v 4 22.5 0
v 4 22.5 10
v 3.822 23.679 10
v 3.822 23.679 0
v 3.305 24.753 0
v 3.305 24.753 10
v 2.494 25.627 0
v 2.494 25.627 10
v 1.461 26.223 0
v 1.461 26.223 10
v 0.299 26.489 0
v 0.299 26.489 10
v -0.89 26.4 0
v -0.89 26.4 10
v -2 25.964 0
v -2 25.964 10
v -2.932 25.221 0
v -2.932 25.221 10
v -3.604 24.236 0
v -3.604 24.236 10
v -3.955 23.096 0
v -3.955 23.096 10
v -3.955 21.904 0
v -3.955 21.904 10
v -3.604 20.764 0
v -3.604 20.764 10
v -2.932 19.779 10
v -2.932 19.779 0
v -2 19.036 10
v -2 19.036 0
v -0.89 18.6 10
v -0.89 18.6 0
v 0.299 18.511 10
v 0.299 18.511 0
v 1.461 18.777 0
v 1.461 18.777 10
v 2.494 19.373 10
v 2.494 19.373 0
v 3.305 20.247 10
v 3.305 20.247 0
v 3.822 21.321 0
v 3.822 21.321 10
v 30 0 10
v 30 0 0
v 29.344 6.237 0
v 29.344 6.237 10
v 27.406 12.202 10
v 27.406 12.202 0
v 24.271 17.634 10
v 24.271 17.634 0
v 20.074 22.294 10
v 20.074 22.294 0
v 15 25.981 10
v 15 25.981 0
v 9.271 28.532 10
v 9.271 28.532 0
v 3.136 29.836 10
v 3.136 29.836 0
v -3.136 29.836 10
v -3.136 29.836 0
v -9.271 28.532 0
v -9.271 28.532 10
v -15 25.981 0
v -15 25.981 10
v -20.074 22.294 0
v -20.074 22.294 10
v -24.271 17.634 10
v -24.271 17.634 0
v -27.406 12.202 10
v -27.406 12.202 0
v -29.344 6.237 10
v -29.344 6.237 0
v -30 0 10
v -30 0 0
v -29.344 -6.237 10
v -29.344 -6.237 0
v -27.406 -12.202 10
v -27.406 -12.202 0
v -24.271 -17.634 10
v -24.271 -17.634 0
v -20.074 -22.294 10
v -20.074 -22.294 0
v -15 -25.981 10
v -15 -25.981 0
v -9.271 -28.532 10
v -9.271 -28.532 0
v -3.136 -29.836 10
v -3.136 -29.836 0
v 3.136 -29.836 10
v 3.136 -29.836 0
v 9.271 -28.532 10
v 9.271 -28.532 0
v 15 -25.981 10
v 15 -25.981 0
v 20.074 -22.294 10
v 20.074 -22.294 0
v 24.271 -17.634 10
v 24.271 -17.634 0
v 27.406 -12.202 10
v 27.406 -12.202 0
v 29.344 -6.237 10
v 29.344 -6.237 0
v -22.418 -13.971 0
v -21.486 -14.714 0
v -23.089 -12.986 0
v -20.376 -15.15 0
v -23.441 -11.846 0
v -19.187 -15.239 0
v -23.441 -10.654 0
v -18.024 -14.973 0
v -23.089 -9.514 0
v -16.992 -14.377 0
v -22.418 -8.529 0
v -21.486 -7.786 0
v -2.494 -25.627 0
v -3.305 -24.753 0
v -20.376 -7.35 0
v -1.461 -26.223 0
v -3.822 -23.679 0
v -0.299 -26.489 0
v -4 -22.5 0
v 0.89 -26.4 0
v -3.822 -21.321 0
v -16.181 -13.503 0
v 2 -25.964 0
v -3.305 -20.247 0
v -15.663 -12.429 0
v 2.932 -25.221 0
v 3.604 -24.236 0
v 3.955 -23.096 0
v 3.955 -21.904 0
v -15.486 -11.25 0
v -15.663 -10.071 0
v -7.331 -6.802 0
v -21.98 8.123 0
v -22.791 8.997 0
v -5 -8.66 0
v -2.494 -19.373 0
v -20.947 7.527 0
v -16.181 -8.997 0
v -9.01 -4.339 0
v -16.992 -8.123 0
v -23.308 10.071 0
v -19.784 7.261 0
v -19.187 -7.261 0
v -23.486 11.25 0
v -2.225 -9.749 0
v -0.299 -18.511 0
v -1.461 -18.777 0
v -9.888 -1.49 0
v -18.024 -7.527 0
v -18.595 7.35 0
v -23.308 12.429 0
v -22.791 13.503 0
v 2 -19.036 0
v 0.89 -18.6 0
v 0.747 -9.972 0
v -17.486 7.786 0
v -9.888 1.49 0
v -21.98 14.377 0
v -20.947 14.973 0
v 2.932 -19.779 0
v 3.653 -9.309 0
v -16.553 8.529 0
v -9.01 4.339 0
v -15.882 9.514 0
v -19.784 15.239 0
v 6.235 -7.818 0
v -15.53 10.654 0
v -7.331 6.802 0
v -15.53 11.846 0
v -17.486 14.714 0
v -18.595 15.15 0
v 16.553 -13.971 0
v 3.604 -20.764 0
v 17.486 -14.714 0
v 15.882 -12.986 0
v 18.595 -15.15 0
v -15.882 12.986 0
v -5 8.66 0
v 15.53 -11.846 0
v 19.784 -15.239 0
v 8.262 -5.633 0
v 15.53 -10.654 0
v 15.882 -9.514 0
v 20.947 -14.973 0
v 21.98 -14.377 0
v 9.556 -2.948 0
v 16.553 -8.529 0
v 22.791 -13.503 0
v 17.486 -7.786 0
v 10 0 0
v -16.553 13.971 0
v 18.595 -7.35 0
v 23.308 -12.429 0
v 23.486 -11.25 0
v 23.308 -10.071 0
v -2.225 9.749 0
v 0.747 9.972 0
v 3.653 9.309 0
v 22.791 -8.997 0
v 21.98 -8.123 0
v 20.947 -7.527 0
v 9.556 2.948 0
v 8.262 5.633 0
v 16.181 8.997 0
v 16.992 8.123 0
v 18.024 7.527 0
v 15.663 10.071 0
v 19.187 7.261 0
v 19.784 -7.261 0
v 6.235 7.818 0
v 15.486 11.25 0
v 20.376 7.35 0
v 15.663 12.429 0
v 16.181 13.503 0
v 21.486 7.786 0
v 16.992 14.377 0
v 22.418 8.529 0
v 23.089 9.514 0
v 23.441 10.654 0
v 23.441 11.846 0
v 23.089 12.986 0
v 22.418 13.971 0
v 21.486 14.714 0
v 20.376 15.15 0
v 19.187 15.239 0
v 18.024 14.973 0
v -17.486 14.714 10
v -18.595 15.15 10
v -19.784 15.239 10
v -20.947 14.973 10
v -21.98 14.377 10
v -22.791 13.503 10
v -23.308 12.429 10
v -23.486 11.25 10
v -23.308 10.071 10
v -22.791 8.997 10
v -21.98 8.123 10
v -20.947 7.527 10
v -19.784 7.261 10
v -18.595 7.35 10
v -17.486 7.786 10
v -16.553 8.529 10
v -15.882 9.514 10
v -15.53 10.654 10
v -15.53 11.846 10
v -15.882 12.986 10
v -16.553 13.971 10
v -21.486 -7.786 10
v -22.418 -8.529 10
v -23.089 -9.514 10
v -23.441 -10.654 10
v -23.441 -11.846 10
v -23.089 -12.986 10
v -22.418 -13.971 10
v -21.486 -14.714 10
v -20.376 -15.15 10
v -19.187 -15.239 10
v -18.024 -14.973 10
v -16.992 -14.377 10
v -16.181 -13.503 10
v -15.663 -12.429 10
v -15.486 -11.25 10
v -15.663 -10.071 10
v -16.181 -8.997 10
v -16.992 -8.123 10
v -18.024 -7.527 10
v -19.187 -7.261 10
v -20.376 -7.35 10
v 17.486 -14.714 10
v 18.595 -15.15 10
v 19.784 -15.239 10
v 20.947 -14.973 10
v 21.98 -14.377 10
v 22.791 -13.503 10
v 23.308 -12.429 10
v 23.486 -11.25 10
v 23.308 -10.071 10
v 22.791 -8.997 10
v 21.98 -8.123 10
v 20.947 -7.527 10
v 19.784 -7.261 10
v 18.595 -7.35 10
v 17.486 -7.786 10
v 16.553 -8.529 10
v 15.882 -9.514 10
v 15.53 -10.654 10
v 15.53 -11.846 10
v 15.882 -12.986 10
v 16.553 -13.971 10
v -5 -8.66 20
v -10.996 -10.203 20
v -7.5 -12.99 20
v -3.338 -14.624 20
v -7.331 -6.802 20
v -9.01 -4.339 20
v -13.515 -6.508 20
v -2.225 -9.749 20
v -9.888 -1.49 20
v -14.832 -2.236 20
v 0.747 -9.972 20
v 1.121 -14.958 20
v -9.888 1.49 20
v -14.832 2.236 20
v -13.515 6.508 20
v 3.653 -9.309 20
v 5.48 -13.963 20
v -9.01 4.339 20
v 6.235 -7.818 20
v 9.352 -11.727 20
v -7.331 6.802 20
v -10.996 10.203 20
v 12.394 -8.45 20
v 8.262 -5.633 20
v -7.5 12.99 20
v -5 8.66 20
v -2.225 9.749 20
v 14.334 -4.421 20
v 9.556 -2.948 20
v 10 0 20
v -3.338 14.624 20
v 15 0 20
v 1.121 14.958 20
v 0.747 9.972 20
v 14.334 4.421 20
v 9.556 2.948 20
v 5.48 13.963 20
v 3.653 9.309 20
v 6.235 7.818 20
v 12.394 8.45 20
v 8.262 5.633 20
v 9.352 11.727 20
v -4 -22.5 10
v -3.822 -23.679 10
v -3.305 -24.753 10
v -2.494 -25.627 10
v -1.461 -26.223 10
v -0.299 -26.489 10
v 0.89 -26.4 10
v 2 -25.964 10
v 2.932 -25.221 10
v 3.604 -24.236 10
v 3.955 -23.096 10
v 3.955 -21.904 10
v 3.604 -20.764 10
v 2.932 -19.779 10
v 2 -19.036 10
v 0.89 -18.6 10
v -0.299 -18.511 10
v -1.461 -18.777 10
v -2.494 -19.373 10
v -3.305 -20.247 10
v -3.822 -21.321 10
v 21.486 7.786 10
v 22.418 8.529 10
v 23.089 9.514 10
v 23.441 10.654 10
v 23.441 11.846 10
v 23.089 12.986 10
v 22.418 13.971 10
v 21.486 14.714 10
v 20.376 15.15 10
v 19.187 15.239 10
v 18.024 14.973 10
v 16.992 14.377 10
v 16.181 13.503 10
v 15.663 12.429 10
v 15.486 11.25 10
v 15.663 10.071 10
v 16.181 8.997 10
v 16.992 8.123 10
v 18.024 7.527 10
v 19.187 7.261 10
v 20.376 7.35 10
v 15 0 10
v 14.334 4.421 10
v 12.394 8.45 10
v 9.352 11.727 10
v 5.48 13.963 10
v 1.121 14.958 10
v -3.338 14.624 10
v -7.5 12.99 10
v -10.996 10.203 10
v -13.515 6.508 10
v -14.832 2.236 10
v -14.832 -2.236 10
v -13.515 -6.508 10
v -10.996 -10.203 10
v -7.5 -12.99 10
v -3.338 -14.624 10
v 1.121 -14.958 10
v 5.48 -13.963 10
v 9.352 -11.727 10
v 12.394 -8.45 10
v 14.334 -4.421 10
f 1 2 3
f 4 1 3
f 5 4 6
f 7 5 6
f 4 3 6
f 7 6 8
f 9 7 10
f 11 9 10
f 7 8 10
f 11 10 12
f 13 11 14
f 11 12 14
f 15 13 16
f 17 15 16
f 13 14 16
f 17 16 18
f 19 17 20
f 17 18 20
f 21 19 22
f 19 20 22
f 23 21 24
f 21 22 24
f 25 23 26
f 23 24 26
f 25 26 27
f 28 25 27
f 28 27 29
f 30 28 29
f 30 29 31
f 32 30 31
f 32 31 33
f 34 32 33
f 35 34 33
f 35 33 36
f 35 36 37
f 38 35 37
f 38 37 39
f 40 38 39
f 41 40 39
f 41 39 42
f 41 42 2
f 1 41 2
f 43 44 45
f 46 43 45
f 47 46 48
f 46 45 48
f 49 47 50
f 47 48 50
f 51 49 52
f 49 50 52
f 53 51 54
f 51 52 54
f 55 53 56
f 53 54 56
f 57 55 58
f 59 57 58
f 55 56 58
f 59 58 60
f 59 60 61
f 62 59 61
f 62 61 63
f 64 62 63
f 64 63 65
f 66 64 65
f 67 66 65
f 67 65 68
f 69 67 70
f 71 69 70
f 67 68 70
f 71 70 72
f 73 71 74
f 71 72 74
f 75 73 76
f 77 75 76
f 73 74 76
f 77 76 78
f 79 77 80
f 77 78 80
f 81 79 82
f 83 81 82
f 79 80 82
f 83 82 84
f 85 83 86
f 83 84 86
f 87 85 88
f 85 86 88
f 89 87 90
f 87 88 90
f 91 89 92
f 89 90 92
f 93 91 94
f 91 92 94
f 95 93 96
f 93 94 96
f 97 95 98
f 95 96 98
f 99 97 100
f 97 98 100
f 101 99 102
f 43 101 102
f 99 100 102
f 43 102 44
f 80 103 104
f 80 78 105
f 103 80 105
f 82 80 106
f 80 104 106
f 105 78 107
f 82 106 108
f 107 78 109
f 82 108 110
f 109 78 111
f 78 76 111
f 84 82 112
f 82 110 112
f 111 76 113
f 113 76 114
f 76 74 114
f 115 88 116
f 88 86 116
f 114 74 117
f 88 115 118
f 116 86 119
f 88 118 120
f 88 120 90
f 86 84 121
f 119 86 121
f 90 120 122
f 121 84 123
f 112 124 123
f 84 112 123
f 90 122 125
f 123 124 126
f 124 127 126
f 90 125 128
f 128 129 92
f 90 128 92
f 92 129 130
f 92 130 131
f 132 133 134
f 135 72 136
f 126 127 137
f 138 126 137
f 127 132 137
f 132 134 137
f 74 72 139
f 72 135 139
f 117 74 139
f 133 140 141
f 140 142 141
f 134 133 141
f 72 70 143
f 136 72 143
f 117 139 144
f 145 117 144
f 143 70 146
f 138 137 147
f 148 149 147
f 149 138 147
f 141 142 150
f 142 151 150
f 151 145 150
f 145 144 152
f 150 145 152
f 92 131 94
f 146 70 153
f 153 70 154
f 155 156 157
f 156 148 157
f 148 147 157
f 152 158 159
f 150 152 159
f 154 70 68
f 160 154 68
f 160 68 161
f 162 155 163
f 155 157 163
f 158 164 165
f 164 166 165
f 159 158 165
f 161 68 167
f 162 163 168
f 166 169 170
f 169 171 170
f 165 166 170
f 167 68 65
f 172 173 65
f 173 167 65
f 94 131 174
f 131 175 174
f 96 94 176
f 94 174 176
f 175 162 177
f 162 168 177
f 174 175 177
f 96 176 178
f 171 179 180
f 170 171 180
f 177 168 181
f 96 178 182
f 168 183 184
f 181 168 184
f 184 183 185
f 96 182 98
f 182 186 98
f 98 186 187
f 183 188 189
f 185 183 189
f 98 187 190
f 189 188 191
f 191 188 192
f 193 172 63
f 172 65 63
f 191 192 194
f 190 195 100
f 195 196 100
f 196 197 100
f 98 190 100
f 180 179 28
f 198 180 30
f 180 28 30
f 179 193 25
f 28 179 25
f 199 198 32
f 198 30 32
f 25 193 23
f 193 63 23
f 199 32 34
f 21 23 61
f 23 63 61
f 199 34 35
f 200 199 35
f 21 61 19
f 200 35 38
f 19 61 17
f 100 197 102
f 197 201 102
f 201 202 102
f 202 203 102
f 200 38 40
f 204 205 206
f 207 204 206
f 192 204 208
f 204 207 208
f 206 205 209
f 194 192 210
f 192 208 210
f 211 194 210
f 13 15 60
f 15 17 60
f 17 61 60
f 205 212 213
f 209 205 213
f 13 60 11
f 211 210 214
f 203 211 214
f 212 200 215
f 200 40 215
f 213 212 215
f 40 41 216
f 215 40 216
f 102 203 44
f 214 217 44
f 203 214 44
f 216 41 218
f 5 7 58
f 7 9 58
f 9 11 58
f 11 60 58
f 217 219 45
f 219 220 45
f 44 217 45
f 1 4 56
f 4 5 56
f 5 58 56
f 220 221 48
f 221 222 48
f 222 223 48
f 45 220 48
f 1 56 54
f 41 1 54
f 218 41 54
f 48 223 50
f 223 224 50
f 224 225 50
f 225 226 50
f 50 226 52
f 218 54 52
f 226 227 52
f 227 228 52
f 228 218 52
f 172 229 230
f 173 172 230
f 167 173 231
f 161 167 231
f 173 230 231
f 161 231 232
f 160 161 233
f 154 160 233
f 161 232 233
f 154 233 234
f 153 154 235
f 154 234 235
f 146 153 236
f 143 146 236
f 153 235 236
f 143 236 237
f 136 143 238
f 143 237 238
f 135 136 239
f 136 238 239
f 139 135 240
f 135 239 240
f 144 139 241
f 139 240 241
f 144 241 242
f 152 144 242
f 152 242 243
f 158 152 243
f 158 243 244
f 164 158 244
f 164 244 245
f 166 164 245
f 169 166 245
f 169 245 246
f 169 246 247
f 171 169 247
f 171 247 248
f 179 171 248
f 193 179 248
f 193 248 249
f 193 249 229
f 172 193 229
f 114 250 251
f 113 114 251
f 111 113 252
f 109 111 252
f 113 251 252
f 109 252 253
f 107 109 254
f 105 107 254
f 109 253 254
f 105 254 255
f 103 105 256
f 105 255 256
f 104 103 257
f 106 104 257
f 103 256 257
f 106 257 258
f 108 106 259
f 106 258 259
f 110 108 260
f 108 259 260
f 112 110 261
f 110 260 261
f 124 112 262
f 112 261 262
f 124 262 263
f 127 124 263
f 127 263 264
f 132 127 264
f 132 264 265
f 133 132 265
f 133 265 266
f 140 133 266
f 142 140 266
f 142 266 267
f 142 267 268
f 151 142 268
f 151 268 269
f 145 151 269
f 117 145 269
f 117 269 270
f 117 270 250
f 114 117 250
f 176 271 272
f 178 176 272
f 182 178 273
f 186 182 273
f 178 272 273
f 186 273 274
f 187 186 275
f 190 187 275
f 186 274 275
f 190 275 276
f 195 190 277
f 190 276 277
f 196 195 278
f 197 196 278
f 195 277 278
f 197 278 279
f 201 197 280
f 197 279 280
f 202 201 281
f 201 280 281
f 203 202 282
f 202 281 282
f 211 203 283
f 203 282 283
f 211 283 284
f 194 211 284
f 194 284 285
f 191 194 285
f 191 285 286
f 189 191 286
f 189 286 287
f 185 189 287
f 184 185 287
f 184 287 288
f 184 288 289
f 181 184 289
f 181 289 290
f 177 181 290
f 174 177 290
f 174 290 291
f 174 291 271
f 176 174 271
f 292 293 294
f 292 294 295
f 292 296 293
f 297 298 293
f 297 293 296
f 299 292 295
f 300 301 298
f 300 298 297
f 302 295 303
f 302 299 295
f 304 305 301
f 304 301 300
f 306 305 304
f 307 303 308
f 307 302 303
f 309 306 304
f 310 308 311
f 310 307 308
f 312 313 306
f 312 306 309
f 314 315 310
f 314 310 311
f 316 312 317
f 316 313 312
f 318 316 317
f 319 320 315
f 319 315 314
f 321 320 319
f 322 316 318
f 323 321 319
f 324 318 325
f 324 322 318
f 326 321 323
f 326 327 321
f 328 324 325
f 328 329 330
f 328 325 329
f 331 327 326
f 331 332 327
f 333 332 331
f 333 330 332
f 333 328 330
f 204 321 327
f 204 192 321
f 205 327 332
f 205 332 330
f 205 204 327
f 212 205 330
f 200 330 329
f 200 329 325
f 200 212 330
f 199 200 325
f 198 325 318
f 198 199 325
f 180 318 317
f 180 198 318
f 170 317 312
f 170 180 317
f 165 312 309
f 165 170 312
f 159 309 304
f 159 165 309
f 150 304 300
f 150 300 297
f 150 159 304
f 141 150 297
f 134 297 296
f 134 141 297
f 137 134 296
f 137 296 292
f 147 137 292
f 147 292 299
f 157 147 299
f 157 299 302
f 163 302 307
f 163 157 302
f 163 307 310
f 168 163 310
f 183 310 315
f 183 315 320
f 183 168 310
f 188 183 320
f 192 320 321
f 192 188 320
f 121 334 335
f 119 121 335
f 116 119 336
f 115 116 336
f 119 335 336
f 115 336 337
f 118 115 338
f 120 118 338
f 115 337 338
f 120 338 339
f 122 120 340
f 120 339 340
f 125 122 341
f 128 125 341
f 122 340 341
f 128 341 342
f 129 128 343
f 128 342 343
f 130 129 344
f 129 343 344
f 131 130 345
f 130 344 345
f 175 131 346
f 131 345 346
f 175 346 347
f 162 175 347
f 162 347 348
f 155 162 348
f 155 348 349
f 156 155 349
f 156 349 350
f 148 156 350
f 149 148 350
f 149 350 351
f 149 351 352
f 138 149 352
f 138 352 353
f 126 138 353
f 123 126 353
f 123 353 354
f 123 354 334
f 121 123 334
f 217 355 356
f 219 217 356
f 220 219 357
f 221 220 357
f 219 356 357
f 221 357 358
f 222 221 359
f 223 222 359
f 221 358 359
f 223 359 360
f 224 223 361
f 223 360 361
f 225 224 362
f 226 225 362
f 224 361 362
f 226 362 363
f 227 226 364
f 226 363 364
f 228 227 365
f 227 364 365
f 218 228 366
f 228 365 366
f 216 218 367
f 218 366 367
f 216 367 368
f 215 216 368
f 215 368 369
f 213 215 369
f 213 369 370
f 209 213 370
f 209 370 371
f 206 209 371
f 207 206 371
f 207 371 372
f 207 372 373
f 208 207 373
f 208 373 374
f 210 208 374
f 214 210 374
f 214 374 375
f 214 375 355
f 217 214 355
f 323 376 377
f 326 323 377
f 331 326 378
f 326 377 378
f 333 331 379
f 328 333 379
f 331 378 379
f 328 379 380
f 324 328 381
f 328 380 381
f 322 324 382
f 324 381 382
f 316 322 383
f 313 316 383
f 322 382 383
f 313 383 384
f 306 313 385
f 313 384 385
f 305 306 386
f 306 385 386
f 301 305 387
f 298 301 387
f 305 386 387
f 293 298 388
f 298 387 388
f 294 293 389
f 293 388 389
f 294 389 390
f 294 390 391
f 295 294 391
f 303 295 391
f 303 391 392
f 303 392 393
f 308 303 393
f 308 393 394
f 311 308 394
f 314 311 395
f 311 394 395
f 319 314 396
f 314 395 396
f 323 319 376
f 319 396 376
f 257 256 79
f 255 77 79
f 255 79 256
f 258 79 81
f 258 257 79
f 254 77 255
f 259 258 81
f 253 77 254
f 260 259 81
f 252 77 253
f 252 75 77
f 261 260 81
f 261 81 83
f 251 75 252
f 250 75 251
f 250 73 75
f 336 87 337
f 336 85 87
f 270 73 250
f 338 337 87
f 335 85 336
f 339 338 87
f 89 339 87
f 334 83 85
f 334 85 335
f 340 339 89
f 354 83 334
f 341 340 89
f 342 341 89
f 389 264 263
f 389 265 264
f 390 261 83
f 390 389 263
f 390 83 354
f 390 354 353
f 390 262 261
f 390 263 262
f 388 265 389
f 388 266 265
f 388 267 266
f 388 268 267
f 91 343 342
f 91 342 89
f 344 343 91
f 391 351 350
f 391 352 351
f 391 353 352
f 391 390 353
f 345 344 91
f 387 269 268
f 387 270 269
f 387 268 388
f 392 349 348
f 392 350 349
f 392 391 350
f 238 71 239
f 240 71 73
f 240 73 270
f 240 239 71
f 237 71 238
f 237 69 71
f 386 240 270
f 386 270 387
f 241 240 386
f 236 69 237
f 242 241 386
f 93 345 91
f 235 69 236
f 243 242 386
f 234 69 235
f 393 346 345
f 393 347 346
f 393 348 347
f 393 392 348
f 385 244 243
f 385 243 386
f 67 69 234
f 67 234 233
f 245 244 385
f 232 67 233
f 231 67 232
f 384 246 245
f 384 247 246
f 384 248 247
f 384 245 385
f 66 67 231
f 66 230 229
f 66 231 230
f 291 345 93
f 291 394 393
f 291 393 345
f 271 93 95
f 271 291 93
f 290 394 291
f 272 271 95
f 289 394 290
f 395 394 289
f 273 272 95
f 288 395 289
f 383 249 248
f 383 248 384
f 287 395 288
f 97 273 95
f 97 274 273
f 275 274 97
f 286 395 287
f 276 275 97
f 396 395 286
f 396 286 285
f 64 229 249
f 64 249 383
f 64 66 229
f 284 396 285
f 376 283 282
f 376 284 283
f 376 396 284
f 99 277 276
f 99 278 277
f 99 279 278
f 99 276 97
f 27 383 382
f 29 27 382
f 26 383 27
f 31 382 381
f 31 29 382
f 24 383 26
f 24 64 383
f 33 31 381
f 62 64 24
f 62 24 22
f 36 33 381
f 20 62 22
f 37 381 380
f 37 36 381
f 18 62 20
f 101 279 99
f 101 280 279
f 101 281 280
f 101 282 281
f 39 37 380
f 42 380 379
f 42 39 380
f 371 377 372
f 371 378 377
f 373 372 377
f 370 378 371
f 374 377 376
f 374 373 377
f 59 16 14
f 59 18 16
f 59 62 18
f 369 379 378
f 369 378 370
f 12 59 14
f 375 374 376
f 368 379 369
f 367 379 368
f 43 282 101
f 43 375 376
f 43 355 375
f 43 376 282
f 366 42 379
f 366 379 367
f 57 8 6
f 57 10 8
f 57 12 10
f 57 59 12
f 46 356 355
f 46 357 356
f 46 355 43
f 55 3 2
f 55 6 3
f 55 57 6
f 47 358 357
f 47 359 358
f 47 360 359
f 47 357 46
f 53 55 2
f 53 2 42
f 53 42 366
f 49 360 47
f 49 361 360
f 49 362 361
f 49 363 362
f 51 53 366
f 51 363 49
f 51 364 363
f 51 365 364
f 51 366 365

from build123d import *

# Parameters (mm, degrees)
F0_R            = 30
F0_R_2          = 10
F1_DEPTH        = 10
F2_R            = 15
F2_R_2          = 10
F3_DEPTH        = 10
F4_R            = 4
F5_DEPTH        = 10.001
F5_COPIES_COUNT = 6


# Not quite as in the source:
# - a pattern or mirror of a feature is missing from the dataset's text; its kind, count and spacing are read off the source's solid


with BuildPart() as f1:
    # F0 (on Top) → F1 (new body)
    with BuildSketch(Plane.XY):
        Circle(F0_R)
        Circle(F0_R_2, mode=Mode.SUBTRACT)
    extrude(amount=F1_DEPTH)

    # F2 (on face) → F3 (join)
    with BuildSketch(Plane.XY.offset(10)):
        Circle(F2_R)
        Circle(F2_R_2, mode=Mode.SUBTRACT)
    extrude(amount=F3_DEPTH)

    # F4 (on face) → F5 (cut, through all)
    with BuildSketch(Plane.XY.offset(10)):
        with Locations((0, 22.5)):
            Circle(F4_R)
    f5 = extrude(amount=-F5_DEPTH, mode=Mode.SUBTRACT)

    # F5_copies: F5 ×6 about axis
    f5_copies_axis = Axis((0, 0, 0), (0, 0, 1))
    for i in range(1, F5_COPIES_COUNT):
        add(f5.rotate(f5_copies_axis, i * 360 / F5_COPIES_COUNT), mode=Mode.SUBTRACT)


solid = f1.part
